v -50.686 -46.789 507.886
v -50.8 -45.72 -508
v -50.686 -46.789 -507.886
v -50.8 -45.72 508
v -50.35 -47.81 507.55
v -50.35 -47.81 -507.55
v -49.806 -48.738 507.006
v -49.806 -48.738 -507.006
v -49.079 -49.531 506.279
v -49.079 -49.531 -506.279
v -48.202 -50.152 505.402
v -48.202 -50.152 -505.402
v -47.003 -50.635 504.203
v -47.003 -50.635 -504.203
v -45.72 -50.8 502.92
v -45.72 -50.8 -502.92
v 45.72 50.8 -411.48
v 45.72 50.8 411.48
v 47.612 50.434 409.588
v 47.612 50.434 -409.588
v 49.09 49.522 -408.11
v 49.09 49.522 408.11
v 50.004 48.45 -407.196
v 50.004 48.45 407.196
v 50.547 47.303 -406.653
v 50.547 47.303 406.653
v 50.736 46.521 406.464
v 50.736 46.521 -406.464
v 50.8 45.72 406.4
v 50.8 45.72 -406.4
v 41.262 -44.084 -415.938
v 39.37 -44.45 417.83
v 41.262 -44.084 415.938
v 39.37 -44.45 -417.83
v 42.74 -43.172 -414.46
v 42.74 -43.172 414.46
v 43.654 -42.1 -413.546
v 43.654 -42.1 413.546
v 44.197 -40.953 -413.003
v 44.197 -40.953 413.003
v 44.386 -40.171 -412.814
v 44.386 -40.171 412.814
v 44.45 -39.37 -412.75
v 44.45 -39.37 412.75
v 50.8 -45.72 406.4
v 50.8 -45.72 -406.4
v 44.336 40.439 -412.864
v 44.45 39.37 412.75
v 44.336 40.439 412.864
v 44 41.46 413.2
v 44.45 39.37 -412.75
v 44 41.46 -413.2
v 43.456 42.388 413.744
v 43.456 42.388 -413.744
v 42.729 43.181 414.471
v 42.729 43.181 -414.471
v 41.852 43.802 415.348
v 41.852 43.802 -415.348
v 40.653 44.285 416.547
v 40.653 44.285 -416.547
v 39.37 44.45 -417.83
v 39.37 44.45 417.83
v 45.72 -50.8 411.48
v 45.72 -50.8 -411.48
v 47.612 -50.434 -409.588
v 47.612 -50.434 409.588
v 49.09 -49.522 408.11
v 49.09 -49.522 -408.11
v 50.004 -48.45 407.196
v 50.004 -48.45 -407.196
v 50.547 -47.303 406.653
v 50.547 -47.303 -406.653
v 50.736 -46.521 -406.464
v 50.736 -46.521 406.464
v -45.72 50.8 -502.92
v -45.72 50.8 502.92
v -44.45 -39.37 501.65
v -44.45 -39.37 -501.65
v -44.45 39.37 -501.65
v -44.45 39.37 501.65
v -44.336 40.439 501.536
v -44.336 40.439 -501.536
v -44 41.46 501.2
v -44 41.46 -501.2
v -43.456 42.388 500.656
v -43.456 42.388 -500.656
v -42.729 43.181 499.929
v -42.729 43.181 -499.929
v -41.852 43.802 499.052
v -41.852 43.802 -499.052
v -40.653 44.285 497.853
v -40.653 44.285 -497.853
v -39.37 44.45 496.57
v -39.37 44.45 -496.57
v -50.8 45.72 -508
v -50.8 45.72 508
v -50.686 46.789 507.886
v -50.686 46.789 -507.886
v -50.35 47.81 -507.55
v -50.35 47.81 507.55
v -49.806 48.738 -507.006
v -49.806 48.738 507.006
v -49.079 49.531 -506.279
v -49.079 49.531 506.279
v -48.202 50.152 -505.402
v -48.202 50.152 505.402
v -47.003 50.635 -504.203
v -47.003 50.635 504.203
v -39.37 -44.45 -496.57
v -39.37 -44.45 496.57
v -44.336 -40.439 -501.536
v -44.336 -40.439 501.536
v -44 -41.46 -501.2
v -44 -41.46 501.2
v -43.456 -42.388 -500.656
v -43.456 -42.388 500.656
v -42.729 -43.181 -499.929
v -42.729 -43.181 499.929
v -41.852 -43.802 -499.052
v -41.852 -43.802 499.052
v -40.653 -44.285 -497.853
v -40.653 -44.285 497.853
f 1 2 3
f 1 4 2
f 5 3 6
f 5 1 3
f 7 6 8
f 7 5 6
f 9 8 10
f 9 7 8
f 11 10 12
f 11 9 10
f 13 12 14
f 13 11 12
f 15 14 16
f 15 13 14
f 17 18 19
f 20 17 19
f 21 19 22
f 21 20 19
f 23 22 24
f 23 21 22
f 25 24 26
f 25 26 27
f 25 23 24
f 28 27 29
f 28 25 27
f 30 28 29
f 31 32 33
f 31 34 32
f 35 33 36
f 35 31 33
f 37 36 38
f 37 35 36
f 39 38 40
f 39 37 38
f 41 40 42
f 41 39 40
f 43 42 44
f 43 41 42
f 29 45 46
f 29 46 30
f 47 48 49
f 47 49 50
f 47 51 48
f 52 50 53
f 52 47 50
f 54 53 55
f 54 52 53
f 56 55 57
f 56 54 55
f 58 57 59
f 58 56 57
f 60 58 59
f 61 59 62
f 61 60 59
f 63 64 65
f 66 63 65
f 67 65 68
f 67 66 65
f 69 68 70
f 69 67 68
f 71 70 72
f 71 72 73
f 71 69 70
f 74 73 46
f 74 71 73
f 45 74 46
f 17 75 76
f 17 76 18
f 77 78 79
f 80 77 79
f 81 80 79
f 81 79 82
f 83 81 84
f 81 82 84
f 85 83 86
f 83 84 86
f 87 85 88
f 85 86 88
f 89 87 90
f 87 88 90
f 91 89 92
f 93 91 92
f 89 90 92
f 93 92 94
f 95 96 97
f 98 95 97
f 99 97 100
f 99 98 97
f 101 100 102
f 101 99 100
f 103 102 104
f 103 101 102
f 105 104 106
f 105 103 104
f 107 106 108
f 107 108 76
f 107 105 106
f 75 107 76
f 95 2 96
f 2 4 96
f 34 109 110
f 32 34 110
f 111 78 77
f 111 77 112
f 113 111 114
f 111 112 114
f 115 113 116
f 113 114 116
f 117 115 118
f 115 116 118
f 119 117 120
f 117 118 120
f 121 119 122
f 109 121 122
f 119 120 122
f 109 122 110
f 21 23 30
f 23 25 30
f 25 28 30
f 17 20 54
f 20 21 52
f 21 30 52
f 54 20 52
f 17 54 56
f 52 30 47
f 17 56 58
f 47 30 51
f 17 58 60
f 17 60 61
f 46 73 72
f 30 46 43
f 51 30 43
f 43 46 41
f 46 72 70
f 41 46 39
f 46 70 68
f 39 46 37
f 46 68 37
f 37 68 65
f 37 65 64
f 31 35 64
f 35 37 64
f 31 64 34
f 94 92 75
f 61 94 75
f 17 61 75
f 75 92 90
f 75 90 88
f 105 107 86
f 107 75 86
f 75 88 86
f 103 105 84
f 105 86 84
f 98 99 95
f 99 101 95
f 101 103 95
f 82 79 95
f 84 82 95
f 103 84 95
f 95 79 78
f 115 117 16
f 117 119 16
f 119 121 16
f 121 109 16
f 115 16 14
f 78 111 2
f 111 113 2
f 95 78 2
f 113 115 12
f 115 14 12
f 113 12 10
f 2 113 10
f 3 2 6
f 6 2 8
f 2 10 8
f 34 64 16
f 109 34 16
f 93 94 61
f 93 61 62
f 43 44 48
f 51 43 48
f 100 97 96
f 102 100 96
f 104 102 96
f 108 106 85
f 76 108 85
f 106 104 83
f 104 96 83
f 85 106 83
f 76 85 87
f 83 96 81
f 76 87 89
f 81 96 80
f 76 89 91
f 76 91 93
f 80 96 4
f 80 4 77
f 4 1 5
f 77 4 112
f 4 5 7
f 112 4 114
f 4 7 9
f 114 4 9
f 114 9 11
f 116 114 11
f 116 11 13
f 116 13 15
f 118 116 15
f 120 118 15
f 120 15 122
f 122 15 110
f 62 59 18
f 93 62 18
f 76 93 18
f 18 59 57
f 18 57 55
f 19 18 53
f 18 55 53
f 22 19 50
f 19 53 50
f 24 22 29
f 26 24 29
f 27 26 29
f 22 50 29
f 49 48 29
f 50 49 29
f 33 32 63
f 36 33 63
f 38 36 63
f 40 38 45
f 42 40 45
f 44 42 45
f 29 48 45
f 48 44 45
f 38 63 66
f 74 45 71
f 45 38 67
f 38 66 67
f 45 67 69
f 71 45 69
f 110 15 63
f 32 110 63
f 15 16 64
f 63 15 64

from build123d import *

# Parameters (mm, degrees)
F0_W     = 101.6
F0_H     = 101.6
F0_W_2   = 88.9
F0_H_2   = 88.9
F1_DEPTH = 508
F3_DEPTH = 101.601
F4_R     = 5.08


with BuildPart() as f1:
    # F0 (on Top) → F1 (new body, symmetric)
    with BuildSketch(Plane.XY):
        Rectangle(F0_W, F0_H)
        Rectangle(F0_W_2, F0_H_2, mode=Mode.SUBTRACT)
    extrude(amount=F1_DEPTH, both=True)

    # F2 (on face) → F3 (cut, through all)
    with BuildSketch(Plane.XZ.offset(50.8)):
        Polygon((50.8, 508), (-50.8, 508), (50.8, 406.4), align=None)
        Polygon((50.8, -406.4), (-50.8, -508), (50.8, -508), align=None)
    extrude(amount=-F3_DEPTH, mode=Mode.SUBTRACT)

    # F4
    f4_edges = [f1.edges().sort_by_distance(p)[0] for p in [
        (-50.8, -50.8, 0),
        (50.8, -50.8, 0),
        (-50.8, 50.8, 0),
        (50.8, 50.8, 0),
        (44.45, 44.45, 0),
        (-44.45, 44.45, 0),
        (-44.45, -44.45, 0),
        (44.45, -44.45, 0),
    ]]
    fillet(f4_edges, radius=F4_R)


solid = f1.part
